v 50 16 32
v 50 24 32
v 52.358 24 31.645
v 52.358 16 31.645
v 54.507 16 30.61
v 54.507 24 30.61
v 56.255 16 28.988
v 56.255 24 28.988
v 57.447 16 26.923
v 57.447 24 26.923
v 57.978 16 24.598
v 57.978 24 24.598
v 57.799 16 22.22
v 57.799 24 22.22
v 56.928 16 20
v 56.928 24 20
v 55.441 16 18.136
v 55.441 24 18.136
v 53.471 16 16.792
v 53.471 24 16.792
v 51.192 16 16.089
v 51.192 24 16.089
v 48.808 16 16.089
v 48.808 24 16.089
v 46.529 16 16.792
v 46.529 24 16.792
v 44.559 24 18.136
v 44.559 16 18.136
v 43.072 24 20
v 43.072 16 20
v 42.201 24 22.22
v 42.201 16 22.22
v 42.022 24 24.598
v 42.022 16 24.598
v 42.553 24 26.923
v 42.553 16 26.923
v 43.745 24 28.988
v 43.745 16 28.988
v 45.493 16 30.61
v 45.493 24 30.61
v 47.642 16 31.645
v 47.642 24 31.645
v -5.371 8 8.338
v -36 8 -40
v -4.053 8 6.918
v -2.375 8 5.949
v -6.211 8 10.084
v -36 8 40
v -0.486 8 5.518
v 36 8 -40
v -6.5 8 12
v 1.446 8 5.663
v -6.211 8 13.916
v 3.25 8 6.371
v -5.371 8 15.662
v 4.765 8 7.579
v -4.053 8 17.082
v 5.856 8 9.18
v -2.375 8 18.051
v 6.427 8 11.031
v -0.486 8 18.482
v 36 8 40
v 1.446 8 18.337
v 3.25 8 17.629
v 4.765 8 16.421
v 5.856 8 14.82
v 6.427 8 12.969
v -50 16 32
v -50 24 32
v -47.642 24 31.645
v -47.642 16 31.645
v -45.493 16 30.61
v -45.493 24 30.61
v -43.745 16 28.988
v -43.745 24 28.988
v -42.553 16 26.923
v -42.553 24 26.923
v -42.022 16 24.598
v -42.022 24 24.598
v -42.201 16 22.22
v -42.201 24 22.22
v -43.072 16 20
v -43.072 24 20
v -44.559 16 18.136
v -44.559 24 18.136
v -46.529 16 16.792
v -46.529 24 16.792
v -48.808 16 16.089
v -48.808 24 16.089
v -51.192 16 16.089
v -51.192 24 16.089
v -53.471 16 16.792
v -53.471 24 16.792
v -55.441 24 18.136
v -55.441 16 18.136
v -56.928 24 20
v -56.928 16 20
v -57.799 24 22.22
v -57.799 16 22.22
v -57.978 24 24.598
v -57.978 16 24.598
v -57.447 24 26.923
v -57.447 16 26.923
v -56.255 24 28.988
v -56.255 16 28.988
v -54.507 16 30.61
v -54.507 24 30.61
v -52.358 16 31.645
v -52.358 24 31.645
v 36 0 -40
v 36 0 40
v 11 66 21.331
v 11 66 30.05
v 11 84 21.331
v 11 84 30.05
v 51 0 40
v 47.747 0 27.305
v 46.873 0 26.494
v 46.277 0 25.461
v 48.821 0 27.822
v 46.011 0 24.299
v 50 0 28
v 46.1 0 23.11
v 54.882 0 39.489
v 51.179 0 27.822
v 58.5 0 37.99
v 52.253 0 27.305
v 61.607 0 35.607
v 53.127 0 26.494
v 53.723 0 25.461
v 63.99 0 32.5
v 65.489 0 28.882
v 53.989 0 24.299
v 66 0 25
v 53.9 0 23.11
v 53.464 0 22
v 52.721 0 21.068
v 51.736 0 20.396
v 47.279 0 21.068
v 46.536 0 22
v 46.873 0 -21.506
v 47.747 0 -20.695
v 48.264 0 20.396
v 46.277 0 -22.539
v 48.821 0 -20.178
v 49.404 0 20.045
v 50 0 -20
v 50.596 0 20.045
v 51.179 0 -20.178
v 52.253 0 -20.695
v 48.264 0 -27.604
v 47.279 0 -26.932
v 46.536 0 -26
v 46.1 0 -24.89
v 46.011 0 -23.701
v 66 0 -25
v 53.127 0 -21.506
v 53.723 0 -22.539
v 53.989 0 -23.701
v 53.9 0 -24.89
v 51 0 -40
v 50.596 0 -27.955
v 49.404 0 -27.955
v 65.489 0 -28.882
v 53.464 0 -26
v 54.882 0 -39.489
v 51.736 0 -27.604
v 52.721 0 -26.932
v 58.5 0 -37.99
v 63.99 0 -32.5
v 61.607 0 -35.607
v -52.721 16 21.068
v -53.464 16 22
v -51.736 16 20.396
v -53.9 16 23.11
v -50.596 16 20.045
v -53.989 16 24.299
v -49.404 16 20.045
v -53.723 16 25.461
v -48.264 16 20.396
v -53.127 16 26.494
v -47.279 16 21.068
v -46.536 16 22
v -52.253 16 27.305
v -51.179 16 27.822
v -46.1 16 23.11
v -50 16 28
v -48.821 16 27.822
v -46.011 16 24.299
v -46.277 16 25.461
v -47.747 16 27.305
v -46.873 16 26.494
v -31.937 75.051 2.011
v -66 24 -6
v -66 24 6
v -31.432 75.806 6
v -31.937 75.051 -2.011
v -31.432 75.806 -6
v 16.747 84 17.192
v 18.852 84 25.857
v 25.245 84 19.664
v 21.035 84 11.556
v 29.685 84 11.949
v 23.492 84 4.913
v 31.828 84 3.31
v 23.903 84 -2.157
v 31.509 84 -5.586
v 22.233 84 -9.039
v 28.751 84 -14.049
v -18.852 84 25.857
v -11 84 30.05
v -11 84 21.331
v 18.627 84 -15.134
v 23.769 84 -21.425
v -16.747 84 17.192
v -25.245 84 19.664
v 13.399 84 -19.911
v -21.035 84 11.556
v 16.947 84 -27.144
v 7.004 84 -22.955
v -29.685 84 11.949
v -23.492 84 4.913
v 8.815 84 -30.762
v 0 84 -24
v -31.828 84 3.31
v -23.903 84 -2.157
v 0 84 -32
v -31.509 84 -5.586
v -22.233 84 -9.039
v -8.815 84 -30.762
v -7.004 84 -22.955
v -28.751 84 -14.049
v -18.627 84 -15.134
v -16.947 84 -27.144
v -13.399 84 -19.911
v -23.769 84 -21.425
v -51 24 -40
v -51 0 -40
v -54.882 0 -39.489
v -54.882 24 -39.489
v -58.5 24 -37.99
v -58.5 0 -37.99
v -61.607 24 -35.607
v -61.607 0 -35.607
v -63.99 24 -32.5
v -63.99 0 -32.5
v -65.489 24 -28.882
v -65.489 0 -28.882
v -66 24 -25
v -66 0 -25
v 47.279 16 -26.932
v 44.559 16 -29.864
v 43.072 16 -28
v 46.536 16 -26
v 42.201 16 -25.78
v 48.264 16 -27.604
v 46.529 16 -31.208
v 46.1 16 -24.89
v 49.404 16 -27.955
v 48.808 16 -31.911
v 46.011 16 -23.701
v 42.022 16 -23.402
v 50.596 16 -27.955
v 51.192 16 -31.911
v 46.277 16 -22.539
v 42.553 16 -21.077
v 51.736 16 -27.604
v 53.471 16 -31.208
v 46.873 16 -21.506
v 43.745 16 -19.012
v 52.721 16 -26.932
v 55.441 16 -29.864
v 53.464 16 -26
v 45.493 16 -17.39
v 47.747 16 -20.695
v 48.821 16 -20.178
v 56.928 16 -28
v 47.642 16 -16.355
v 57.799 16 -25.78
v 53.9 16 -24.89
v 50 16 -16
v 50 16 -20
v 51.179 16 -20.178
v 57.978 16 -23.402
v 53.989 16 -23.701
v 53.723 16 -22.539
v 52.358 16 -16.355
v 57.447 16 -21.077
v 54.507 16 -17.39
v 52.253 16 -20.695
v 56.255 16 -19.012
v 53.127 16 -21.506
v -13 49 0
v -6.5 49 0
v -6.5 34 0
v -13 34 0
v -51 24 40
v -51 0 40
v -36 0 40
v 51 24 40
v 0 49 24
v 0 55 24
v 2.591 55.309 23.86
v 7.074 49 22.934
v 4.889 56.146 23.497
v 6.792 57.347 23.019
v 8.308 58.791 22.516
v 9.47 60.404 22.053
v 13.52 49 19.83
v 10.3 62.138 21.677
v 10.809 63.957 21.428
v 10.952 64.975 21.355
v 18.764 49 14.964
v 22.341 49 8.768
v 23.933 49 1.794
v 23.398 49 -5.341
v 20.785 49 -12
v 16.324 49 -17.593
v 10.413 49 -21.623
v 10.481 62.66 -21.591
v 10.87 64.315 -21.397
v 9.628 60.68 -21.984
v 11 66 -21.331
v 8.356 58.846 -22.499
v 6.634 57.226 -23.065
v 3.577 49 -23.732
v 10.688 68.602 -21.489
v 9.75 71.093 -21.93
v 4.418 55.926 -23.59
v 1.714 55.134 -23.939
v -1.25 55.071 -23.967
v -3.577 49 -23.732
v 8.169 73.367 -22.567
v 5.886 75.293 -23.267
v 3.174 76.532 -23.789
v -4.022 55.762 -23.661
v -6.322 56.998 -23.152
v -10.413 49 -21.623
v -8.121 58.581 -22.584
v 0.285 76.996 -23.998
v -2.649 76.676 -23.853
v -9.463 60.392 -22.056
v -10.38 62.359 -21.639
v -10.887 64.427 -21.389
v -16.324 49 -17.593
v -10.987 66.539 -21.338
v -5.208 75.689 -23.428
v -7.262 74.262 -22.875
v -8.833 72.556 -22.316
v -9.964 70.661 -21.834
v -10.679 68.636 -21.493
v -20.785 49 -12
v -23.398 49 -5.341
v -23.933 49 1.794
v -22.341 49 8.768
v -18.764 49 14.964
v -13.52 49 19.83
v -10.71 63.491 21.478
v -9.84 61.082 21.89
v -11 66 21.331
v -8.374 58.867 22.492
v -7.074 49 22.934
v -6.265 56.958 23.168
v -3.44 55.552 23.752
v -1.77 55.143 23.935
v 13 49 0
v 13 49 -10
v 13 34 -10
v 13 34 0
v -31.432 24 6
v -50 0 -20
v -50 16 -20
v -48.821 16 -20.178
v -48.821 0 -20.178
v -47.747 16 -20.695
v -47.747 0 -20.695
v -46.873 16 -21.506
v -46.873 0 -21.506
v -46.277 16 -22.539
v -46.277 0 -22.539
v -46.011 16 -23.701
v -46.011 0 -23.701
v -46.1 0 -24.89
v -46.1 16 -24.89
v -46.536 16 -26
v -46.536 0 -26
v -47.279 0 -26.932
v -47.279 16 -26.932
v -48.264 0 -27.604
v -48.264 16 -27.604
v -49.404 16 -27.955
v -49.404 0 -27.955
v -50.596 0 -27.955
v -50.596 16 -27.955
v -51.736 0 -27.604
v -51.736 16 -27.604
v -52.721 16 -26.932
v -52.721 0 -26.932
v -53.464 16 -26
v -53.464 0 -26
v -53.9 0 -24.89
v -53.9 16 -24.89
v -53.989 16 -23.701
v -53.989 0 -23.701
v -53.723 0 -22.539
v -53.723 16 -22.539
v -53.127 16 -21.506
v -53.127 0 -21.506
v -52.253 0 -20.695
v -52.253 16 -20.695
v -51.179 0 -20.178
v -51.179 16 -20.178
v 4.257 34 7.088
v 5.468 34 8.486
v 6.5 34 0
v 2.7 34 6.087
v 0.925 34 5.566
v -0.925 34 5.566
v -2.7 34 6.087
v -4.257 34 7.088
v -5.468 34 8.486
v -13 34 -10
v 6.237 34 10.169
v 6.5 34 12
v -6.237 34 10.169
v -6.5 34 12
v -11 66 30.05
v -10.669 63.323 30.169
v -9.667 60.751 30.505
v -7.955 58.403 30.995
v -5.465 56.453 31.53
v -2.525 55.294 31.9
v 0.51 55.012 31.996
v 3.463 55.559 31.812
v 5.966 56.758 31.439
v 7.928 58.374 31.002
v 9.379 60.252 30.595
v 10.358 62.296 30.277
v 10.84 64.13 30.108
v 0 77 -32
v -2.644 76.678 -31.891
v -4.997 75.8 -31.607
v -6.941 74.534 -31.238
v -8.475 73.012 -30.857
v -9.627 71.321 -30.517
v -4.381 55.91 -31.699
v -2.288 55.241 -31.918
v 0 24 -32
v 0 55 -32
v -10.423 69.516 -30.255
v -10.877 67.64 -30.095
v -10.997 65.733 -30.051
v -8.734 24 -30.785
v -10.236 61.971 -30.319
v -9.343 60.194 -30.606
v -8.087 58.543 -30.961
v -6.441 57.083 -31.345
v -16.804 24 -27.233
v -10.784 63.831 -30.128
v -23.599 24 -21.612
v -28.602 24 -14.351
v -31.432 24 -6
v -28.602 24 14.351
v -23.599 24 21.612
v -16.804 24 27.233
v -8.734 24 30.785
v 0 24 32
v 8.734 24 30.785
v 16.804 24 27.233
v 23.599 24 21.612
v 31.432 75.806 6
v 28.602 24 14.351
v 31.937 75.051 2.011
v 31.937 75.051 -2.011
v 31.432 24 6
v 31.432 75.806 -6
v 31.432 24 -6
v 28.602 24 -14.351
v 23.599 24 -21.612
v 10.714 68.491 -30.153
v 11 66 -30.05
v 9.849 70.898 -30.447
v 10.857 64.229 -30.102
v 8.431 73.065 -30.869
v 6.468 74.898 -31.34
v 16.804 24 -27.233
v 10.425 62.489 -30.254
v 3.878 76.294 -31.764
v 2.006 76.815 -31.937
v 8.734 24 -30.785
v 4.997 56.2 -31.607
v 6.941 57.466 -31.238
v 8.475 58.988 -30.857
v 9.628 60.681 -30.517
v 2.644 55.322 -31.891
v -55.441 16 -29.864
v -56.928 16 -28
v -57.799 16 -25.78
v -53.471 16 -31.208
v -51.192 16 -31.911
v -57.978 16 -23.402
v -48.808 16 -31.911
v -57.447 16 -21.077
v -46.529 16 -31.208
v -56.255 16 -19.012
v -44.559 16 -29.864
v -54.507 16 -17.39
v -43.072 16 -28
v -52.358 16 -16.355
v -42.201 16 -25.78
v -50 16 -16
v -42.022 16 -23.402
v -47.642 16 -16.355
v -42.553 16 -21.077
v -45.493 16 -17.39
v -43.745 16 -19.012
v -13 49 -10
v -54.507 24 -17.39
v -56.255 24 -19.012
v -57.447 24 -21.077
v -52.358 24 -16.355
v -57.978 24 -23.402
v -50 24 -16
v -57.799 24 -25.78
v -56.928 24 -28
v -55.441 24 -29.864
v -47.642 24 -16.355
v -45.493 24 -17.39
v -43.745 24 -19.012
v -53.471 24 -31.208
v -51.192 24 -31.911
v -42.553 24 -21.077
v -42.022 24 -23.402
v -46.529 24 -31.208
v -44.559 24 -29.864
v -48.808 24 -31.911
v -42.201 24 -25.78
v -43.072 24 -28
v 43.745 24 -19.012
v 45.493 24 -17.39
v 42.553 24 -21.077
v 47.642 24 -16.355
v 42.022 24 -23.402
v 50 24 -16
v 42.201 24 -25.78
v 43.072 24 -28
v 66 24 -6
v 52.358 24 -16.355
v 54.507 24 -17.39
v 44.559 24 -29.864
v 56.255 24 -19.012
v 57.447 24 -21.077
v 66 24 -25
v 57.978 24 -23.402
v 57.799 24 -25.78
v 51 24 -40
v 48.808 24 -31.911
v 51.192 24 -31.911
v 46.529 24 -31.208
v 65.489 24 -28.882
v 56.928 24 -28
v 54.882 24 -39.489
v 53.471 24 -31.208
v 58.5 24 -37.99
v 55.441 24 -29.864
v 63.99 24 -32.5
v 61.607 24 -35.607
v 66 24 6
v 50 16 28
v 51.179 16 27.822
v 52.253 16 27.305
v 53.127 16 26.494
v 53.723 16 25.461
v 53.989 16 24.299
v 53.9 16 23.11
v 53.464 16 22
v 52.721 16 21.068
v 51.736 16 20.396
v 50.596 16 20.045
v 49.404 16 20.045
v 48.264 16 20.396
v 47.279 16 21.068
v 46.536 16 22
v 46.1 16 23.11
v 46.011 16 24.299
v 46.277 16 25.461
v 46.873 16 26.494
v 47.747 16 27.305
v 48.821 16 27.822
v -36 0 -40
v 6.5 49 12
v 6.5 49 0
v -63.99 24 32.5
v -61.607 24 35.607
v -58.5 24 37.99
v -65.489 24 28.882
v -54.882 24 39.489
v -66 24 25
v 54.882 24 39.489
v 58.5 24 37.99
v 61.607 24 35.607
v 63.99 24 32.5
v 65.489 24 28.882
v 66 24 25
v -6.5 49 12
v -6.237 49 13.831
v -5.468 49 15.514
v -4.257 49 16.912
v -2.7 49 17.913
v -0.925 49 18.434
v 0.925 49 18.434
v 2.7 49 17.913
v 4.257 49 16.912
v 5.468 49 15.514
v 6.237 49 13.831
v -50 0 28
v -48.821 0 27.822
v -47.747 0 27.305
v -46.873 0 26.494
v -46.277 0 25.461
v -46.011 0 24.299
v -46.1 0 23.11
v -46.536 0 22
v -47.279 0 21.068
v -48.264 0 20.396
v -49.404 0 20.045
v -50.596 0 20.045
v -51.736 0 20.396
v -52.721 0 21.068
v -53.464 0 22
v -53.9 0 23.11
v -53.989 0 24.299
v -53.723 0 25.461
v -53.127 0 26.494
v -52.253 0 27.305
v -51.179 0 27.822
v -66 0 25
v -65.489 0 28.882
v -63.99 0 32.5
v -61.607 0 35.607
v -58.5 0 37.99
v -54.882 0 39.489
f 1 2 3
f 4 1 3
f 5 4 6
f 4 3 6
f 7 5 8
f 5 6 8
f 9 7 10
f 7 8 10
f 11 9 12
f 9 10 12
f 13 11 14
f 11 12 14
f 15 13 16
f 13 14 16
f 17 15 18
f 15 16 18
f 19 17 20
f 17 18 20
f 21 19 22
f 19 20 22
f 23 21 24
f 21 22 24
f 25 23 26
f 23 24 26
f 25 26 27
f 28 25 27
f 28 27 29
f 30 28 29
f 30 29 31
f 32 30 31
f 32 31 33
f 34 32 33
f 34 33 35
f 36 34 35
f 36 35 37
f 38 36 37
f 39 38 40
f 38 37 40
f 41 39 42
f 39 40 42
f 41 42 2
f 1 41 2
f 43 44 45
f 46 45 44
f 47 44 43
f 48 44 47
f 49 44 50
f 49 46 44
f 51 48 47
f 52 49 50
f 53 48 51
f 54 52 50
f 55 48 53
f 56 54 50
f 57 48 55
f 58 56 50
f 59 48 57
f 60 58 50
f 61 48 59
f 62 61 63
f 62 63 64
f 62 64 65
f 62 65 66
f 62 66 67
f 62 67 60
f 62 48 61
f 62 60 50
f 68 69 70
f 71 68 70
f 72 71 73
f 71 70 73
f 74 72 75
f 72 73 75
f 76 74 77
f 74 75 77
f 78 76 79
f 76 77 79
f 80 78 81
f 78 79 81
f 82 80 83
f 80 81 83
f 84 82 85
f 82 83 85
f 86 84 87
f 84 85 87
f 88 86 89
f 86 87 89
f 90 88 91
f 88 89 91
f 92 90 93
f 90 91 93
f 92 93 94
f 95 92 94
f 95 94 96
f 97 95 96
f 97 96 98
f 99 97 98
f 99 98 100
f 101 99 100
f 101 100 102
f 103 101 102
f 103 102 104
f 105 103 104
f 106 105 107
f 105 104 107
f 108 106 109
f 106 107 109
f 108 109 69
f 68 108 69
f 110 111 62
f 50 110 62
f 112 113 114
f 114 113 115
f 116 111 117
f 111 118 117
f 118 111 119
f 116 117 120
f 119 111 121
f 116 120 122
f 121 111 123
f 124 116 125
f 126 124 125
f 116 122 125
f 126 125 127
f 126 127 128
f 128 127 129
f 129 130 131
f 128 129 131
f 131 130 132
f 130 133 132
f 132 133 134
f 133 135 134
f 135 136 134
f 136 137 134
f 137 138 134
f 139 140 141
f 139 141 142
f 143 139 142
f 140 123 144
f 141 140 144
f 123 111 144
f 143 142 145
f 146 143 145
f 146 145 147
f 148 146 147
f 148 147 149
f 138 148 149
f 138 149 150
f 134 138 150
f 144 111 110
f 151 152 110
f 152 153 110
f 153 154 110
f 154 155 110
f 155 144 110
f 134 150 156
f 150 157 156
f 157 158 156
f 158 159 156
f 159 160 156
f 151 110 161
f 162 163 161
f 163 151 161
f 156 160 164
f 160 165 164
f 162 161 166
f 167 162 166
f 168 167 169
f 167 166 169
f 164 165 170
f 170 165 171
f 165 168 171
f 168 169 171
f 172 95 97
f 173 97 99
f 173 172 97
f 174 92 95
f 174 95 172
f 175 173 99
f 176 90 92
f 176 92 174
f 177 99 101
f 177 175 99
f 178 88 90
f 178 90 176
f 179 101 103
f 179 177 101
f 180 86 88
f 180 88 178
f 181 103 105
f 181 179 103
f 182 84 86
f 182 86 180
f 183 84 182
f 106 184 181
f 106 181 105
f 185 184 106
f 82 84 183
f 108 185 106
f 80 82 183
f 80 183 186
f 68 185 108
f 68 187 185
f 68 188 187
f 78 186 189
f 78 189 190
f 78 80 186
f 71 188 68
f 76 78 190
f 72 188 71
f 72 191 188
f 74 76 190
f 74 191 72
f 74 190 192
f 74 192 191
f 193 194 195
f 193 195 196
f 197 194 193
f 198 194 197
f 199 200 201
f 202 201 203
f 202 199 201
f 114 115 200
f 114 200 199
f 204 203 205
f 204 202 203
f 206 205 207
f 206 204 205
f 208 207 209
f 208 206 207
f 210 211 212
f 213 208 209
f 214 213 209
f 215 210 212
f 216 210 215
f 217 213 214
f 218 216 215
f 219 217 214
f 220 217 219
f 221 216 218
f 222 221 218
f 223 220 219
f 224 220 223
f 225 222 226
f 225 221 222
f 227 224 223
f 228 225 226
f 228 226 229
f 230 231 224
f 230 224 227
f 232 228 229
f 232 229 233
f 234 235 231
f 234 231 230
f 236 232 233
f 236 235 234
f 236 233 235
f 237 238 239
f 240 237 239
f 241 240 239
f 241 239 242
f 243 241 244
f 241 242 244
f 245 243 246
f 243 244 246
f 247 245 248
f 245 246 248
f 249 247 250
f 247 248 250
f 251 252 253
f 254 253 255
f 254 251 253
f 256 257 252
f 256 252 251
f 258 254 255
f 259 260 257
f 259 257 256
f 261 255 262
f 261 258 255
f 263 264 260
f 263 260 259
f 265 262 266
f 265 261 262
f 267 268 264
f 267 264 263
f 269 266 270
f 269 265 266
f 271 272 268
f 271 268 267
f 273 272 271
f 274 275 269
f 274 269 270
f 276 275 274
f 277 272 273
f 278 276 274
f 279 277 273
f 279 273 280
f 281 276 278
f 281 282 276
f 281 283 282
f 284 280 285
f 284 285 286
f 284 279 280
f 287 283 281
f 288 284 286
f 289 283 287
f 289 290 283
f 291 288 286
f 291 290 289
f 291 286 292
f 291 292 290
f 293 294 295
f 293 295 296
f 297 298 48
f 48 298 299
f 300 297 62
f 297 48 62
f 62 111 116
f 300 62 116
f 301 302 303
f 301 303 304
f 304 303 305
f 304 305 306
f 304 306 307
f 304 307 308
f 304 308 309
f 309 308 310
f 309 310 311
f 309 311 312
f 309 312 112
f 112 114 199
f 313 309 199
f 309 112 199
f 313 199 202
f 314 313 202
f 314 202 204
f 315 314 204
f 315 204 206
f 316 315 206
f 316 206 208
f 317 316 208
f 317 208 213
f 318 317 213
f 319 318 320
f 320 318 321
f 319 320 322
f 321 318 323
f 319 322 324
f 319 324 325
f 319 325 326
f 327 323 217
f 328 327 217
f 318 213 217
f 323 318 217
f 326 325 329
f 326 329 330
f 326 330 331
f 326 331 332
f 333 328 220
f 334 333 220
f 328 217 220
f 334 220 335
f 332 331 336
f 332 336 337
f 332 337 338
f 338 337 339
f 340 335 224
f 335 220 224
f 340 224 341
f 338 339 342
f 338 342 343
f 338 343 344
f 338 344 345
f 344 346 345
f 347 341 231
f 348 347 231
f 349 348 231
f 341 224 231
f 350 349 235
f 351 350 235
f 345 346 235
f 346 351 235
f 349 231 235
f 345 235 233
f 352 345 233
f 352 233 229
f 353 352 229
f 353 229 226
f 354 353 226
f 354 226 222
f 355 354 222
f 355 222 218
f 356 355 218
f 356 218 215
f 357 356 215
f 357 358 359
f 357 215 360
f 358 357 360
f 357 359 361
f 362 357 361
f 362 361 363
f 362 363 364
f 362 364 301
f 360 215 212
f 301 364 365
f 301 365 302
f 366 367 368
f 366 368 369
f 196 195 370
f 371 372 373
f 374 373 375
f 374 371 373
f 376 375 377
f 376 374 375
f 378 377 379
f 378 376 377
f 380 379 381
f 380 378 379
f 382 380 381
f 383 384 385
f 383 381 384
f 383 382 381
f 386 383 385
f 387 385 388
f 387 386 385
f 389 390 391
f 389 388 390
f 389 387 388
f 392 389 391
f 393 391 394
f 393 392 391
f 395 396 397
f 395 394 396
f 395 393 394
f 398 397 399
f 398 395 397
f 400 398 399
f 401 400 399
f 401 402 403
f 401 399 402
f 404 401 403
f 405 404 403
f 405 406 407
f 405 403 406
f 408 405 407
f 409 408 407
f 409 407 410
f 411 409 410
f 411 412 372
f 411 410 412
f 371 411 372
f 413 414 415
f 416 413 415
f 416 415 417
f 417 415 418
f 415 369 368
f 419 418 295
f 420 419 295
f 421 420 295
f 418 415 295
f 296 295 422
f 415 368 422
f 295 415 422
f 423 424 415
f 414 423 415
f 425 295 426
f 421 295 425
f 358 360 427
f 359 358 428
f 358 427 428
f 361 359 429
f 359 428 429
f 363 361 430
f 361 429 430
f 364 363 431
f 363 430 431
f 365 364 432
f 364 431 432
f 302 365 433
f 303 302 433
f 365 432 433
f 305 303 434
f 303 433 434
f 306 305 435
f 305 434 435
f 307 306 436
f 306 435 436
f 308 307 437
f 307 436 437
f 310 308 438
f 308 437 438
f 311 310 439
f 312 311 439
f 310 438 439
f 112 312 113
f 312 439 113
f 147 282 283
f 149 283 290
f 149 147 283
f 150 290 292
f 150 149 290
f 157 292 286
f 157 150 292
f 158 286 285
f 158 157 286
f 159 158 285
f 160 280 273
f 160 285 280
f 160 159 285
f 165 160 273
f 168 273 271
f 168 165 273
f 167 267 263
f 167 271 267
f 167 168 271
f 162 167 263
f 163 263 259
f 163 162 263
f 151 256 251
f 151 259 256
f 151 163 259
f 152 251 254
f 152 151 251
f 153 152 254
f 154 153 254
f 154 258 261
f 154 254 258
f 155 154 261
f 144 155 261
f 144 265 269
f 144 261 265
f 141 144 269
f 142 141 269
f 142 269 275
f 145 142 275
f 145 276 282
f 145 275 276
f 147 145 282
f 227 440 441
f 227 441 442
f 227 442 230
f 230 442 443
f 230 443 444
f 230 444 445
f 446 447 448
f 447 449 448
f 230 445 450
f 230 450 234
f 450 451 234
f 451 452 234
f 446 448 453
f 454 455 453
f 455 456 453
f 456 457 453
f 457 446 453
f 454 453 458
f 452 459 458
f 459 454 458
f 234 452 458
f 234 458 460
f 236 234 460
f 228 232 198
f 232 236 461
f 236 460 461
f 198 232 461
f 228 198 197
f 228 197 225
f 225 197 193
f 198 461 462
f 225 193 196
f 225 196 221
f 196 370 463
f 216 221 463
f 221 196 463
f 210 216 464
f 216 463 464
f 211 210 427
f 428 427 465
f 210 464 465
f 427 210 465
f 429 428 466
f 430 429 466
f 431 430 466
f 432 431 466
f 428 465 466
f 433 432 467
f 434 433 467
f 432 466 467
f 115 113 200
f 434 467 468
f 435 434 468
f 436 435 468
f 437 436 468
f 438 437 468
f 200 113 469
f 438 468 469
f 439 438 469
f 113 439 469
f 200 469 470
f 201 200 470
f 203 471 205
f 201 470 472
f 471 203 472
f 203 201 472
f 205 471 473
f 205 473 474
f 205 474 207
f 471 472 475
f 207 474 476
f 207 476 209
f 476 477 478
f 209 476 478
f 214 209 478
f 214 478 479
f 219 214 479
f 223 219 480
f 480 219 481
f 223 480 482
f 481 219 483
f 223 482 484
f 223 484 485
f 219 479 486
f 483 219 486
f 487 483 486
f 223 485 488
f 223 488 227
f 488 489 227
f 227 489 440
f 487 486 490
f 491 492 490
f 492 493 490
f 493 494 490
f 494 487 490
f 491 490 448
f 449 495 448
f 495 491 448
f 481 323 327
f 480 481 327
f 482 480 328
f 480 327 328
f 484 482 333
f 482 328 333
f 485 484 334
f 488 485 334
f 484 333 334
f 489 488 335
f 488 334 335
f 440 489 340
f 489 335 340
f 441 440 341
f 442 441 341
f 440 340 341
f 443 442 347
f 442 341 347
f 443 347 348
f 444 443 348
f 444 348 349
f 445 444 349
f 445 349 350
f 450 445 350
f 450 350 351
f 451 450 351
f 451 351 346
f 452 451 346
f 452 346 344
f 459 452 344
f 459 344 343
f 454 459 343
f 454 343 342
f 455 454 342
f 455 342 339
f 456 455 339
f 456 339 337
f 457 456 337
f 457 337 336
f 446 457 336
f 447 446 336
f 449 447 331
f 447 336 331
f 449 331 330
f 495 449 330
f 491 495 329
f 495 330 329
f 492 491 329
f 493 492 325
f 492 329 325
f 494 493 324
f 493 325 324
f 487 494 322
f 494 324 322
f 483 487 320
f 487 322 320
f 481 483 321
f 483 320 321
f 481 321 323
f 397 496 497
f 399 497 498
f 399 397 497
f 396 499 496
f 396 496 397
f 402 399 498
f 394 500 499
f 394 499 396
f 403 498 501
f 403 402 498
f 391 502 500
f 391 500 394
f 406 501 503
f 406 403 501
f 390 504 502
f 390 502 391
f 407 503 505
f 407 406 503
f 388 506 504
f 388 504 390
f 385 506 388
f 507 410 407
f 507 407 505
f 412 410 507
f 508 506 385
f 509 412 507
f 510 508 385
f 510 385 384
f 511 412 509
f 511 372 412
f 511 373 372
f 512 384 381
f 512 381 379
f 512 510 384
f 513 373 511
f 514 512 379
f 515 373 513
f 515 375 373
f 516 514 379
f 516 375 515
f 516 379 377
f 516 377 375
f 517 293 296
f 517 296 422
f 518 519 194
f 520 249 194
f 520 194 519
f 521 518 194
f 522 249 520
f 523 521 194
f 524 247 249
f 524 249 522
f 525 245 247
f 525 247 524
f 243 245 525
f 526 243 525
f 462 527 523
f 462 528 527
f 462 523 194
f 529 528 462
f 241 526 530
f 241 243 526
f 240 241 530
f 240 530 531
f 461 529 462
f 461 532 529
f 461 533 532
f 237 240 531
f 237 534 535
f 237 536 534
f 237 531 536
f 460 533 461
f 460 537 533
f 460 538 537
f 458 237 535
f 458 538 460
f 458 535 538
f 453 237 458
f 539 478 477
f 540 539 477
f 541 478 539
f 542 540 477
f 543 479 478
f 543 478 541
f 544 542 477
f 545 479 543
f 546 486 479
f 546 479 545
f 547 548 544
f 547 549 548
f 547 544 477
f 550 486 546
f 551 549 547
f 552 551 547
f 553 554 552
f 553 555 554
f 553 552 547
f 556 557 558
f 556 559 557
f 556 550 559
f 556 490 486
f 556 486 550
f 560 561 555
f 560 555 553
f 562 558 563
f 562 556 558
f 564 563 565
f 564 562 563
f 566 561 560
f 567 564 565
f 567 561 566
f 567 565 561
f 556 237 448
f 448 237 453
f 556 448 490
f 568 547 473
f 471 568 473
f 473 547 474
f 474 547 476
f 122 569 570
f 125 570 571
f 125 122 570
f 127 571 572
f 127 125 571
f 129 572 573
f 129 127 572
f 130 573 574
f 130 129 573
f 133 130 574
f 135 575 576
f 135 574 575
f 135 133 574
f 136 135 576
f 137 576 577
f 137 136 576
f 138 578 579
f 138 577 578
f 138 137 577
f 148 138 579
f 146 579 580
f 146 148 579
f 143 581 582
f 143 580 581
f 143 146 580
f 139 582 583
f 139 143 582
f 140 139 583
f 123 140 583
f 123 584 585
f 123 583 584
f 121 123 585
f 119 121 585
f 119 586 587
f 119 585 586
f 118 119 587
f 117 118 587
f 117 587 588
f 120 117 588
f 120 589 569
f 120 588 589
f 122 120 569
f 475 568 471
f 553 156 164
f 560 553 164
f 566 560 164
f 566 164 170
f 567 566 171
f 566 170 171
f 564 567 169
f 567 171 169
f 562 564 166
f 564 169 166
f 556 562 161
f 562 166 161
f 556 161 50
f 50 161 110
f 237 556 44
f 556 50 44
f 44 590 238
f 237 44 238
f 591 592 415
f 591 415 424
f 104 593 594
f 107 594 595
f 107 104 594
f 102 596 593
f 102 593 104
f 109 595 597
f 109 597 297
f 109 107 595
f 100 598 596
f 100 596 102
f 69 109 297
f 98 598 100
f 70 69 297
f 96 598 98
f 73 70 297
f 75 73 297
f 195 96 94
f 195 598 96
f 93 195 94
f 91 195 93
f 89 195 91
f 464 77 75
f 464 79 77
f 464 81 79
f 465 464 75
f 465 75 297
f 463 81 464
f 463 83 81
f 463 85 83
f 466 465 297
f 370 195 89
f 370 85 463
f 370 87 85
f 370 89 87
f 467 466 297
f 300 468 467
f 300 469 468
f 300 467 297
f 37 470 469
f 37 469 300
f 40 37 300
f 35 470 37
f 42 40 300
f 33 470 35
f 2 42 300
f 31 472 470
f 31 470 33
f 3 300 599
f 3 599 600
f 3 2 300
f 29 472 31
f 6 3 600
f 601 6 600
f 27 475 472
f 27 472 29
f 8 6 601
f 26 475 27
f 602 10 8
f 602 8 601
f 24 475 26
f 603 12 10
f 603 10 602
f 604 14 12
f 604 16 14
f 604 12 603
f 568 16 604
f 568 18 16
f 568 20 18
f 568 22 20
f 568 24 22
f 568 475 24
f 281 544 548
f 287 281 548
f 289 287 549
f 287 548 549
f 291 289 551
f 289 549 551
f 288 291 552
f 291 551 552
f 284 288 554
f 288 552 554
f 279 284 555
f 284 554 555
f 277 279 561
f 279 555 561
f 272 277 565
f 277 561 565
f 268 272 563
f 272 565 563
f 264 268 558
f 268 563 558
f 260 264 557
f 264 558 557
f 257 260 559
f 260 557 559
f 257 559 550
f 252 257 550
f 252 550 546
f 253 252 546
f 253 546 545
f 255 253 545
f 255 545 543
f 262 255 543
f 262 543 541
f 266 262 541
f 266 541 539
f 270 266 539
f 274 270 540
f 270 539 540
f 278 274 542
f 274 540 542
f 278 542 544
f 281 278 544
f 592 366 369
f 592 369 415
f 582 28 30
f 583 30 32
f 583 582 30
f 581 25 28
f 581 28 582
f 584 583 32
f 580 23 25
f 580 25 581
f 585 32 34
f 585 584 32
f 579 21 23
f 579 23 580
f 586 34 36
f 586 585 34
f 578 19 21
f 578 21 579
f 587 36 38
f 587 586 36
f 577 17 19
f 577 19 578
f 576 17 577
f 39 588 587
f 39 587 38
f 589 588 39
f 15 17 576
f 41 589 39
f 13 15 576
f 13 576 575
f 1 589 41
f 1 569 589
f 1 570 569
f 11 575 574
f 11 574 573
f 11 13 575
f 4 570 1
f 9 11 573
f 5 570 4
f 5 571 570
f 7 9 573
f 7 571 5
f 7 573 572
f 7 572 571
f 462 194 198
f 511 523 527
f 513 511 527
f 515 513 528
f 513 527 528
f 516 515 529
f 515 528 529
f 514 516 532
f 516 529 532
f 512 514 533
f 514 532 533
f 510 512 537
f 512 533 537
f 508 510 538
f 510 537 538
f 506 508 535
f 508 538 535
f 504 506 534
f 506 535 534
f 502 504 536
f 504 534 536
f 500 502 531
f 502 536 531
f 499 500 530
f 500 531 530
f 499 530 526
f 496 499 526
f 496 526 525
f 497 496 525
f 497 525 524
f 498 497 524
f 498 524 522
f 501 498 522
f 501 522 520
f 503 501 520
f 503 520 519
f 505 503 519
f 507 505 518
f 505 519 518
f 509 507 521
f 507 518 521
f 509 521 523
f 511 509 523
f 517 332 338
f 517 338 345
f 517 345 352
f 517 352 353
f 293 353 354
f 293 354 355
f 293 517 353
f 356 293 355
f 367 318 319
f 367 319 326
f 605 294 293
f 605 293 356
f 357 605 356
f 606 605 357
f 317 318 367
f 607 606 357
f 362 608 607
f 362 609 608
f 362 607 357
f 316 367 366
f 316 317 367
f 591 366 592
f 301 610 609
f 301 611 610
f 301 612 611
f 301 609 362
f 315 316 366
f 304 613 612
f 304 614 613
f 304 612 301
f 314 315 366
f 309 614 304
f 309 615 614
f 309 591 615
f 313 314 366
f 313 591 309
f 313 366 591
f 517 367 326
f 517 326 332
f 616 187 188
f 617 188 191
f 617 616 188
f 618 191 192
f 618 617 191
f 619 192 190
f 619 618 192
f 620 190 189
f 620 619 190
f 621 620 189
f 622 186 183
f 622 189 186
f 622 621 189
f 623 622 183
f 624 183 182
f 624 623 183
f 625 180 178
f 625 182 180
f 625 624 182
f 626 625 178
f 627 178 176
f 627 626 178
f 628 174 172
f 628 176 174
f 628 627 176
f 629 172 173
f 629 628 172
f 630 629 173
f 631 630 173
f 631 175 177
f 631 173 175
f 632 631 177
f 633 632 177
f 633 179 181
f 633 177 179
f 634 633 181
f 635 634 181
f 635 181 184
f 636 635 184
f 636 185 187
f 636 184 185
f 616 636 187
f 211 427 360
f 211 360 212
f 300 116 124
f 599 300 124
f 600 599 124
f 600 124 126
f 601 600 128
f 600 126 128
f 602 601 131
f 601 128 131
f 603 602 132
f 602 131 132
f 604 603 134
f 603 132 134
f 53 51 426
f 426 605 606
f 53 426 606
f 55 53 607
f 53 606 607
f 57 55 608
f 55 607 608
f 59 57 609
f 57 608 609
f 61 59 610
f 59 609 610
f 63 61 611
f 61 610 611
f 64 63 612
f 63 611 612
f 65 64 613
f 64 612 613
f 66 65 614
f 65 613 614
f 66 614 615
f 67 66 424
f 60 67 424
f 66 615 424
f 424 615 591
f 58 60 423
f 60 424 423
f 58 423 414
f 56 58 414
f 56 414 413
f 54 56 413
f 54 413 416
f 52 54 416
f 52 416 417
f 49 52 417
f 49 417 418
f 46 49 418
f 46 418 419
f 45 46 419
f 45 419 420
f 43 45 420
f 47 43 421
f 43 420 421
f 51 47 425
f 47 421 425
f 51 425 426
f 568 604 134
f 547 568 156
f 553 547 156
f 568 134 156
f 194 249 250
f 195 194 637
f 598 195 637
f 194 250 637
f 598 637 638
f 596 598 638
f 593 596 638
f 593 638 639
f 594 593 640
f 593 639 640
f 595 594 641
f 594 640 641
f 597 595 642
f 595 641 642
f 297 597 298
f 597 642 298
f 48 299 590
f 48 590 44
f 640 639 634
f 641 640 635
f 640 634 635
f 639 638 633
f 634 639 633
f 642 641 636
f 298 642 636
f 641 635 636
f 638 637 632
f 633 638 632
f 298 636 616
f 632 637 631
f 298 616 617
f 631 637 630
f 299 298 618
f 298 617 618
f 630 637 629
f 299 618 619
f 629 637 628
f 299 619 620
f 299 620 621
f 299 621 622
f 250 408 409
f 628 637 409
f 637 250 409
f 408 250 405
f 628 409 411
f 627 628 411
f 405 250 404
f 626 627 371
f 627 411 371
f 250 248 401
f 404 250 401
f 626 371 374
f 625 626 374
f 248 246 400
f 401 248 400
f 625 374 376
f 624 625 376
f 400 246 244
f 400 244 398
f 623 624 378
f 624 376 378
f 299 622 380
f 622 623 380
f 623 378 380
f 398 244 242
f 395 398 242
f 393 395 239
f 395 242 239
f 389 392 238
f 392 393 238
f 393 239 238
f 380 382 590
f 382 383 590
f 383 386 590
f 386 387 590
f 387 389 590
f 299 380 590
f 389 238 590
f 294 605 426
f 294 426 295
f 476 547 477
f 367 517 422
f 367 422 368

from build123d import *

# Parameters (mm, degrees)
SKETCH_1_R          = 4
EXTRUDE_1_DEPTH     = 24
SKETCH_2_W          = 72
SKETCH_2_H          = 16
CUT_EXTRUDE_1_DEPTH = 107.451867057
SKETCH_3_R          = 8
CUT_EXTRUDE_2_DEPTH = 8
SKETCH_5_R          = 32
EXTRUDE_2_DEPTH     = 60
SKETCH_6_R          = 24
CUT_EXTRUDE_3_DEPTH = 35
CUT_EXTRUDE_4_DEPTH = 15
SKETCH_8_R          = 6.5
CUT_EXTRUDE_5_DEPTH = 86
SKETCH_9_R          = 11
CUT_EXTRUDE_6_DEPTH = 86
SKETCH_10_W         = 22
SKETCH_10_H         = 21.722562354
CUT_EXTRUDE_7_DEPTH = 38
RIB_8_REACH         = 116.07
SKETCH_12_WALL_W    = 293.316673134
SKETCH_12_WALL_H    = 12


with BuildPart() as part:
    # 草图1 → 凸台-拉伸1 (new body)
    with BuildSketch(Plane(origin=(0, 0, 0), x_dir=(1, 0, 0), z_dir=(0, 1, 0))):
        with BuildLine():
            Line((51, 40), (-51, 40))
            ThreePointArc((-51, 40), (-61.606601718, 35.606601718), (-66, 25))
            Line((-66, 25), (-66, -25))
            ThreePointArc((-66, -25), (-61.606601718, -35.606601718), (-51, -40))
            Line((-51, -40), (51, -40))
            ThreePointArc((51, -40), (61.606601718, -35.606601718), (66, -25))
            Line((66, -25), (66, 25))
            ThreePointArc((66, 25), (61.606601718, 35.606601718), (51, 40))
        make_face()
        with Locations(Location((-50, 24, 0), (0, 0, 270))):
            Circle(SKETCH_1_R, mode=Mode.SUBTRACT)
        with Locations(Location((50, 24, 0), (0, 0, 270))):
            Circle(SKETCH_1_R, mode=Mode.SUBTRACT)
        with Locations(Location((50, -24, 0), (0, 0, 270))):
            Circle(SKETCH_1_R, mode=Mode.SUBTRACT)
        with Locations(Location((-50, -24, 0), (0, 0, 270))):
            Circle(SKETCH_1_R, mode=Mode.SUBTRACT)
    extrude(amount=EXTRUDE_1_DEPTH)

    # 草图2 → 切除-拉伸1 (cut, through all)
    with BuildSketch(Plane.XY.offset(40)):
        Rectangle(SKETCH_2_W, SKETCH_2_H)
    extrude(amount=-CUT_EXTRUDE_1_DEPTH, mode=Mode.SUBTRACT)

    # 草图3 → 切除-拉伸2 (cut)
    with BuildSketch(Plane(origin=(0, 24, 0), x_dir=(1, 0, 0), z_dir=(0, 1, 0))):
        with Locations(Location((-50, 24, 0), (0, 0, 270))):
            Circle(SKETCH_3_R)
        with Locations(Location((50, 24, 0), (0, 0, 270))):
            Circle(SKETCH_3_R)
        with Locations(Location((50, -24, 0), (0, 0, 270))):
            Circle(SKETCH_3_R)
        with Locations(Location((-50, -24, 0), (0, 0, 270))):
            Circle(SKETCH_3_R)
    extrude(amount=-CUT_EXTRUDE_2_DEPTH, mode=Mode.SUBTRACT)

    # 草图5 → 凸台-拉伸2 (add)
    with BuildSketch(Plane(origin=(0, 24, 0), x_dir=(1, 0, 0), z_dir=(0, 1, 0))):
        with Locations(Location((0, 0, 0), (0, 0, 90))):
            Circle(SKETCH_5_R)
    extrude(amount=EXTRUDE_2_DEPTH)

    # 草图6 → 切除-拉伸3 (cut)
    with BuildSketch(Plane(origin=(0, 84, 0), x_dir=(1, 0, 0), z_dir=(0, 1, 0))):
        with Locations(Location((0, 0, 0), (0, 0, 270))):
            Circle(SKETCH_6_R)
    extrude(amount=-CUT_EXTRUDE_3_DEPTH, mode=Mode.SUBTRACT)

    # 草图7 → 切除-拉伸4 (cut)
    with BuildSketch(Plane(origin=(0, 49, 0), x_dir=(1, 0, 0), z_dir=(0, 1, 0))):
        Polygon((6.5, -12), (-6.5, -12), (-6.5, 0), (-13, 0), (-13, 10), (13, 10), (13, 0), (6.5, 0), align=None)
    extrude(amount=-CUT_EXTRUDE_4_DEPTH, mode=Mode.SUBTRACT)

    # 草图8 → 切除-拉伸5 (cut)
    with BuildSketch(Plane(origin=(0, 49, 0), x_dir=(1, 0, 0), z_dir=(0, 1, 0))):
        with Locations(Location((0, -12, 0), (0, 0, 180))):
            Circle(SKETCH_8_R)
    extrude(amount=-CUT_EXTRUDE_5_DEPTH, mode=Mode.SUBTRACT)

    # 草图9 → 切除-拉伸6 (cut)
    with BuildSketch(Plane.XY.offset(40)):
        with Locations((0, 66)):
            Circle(SKETCH_9_R)
    extrude(amount=-CUT_EXTRUDE_6_DEPTH, mode=Mode.SUBTRACT)

    # 草图10 → 切除-拉伸7 (cut)
    with BuildSketch(Plane.XY.offset(40)):
        with Locations((0, 76.861281177)):
            Rectangle(SKETCH_10_W, SKETCH_10_H)
    extrude(amount=-CUT_EXTRUDE_7_DEPTH, mode=Mode.SUBTRACT)

    # 草图12 wall → 筋8 (add, up to next)
    with BuildSketch(Plane(origin=(-48.467514941, 50.275944325, 0), x_dir=(0.555033040636, 0.831828301876, 0), z_dir=(-0.831828301876, 0.555033040636, 0)), mode=Mode.PRIVATE) as rib_8_sk1:
        Rectangle(SKETCH_12_WALL_W, SKETCH_12_WALL_H)
    rib_8_tool1 = extrude(rib_8_sk1.sketch, amount=-RIB_8_REACH, mode=Mode.PRIVATE) - part.part
    rib_8 = rib_8_tool1.solids().sort_by_distance((-48.467514941, 50.275944325, 0))[0]
    add(rib_8)

    # 镜向2: 筋8 across plane
    add(rib_8.mirror(Plane(origin=(0, 0, 0), x_dir=(0, 0, 1), z_dir=(1, 0, 0))))


solid = part.part
